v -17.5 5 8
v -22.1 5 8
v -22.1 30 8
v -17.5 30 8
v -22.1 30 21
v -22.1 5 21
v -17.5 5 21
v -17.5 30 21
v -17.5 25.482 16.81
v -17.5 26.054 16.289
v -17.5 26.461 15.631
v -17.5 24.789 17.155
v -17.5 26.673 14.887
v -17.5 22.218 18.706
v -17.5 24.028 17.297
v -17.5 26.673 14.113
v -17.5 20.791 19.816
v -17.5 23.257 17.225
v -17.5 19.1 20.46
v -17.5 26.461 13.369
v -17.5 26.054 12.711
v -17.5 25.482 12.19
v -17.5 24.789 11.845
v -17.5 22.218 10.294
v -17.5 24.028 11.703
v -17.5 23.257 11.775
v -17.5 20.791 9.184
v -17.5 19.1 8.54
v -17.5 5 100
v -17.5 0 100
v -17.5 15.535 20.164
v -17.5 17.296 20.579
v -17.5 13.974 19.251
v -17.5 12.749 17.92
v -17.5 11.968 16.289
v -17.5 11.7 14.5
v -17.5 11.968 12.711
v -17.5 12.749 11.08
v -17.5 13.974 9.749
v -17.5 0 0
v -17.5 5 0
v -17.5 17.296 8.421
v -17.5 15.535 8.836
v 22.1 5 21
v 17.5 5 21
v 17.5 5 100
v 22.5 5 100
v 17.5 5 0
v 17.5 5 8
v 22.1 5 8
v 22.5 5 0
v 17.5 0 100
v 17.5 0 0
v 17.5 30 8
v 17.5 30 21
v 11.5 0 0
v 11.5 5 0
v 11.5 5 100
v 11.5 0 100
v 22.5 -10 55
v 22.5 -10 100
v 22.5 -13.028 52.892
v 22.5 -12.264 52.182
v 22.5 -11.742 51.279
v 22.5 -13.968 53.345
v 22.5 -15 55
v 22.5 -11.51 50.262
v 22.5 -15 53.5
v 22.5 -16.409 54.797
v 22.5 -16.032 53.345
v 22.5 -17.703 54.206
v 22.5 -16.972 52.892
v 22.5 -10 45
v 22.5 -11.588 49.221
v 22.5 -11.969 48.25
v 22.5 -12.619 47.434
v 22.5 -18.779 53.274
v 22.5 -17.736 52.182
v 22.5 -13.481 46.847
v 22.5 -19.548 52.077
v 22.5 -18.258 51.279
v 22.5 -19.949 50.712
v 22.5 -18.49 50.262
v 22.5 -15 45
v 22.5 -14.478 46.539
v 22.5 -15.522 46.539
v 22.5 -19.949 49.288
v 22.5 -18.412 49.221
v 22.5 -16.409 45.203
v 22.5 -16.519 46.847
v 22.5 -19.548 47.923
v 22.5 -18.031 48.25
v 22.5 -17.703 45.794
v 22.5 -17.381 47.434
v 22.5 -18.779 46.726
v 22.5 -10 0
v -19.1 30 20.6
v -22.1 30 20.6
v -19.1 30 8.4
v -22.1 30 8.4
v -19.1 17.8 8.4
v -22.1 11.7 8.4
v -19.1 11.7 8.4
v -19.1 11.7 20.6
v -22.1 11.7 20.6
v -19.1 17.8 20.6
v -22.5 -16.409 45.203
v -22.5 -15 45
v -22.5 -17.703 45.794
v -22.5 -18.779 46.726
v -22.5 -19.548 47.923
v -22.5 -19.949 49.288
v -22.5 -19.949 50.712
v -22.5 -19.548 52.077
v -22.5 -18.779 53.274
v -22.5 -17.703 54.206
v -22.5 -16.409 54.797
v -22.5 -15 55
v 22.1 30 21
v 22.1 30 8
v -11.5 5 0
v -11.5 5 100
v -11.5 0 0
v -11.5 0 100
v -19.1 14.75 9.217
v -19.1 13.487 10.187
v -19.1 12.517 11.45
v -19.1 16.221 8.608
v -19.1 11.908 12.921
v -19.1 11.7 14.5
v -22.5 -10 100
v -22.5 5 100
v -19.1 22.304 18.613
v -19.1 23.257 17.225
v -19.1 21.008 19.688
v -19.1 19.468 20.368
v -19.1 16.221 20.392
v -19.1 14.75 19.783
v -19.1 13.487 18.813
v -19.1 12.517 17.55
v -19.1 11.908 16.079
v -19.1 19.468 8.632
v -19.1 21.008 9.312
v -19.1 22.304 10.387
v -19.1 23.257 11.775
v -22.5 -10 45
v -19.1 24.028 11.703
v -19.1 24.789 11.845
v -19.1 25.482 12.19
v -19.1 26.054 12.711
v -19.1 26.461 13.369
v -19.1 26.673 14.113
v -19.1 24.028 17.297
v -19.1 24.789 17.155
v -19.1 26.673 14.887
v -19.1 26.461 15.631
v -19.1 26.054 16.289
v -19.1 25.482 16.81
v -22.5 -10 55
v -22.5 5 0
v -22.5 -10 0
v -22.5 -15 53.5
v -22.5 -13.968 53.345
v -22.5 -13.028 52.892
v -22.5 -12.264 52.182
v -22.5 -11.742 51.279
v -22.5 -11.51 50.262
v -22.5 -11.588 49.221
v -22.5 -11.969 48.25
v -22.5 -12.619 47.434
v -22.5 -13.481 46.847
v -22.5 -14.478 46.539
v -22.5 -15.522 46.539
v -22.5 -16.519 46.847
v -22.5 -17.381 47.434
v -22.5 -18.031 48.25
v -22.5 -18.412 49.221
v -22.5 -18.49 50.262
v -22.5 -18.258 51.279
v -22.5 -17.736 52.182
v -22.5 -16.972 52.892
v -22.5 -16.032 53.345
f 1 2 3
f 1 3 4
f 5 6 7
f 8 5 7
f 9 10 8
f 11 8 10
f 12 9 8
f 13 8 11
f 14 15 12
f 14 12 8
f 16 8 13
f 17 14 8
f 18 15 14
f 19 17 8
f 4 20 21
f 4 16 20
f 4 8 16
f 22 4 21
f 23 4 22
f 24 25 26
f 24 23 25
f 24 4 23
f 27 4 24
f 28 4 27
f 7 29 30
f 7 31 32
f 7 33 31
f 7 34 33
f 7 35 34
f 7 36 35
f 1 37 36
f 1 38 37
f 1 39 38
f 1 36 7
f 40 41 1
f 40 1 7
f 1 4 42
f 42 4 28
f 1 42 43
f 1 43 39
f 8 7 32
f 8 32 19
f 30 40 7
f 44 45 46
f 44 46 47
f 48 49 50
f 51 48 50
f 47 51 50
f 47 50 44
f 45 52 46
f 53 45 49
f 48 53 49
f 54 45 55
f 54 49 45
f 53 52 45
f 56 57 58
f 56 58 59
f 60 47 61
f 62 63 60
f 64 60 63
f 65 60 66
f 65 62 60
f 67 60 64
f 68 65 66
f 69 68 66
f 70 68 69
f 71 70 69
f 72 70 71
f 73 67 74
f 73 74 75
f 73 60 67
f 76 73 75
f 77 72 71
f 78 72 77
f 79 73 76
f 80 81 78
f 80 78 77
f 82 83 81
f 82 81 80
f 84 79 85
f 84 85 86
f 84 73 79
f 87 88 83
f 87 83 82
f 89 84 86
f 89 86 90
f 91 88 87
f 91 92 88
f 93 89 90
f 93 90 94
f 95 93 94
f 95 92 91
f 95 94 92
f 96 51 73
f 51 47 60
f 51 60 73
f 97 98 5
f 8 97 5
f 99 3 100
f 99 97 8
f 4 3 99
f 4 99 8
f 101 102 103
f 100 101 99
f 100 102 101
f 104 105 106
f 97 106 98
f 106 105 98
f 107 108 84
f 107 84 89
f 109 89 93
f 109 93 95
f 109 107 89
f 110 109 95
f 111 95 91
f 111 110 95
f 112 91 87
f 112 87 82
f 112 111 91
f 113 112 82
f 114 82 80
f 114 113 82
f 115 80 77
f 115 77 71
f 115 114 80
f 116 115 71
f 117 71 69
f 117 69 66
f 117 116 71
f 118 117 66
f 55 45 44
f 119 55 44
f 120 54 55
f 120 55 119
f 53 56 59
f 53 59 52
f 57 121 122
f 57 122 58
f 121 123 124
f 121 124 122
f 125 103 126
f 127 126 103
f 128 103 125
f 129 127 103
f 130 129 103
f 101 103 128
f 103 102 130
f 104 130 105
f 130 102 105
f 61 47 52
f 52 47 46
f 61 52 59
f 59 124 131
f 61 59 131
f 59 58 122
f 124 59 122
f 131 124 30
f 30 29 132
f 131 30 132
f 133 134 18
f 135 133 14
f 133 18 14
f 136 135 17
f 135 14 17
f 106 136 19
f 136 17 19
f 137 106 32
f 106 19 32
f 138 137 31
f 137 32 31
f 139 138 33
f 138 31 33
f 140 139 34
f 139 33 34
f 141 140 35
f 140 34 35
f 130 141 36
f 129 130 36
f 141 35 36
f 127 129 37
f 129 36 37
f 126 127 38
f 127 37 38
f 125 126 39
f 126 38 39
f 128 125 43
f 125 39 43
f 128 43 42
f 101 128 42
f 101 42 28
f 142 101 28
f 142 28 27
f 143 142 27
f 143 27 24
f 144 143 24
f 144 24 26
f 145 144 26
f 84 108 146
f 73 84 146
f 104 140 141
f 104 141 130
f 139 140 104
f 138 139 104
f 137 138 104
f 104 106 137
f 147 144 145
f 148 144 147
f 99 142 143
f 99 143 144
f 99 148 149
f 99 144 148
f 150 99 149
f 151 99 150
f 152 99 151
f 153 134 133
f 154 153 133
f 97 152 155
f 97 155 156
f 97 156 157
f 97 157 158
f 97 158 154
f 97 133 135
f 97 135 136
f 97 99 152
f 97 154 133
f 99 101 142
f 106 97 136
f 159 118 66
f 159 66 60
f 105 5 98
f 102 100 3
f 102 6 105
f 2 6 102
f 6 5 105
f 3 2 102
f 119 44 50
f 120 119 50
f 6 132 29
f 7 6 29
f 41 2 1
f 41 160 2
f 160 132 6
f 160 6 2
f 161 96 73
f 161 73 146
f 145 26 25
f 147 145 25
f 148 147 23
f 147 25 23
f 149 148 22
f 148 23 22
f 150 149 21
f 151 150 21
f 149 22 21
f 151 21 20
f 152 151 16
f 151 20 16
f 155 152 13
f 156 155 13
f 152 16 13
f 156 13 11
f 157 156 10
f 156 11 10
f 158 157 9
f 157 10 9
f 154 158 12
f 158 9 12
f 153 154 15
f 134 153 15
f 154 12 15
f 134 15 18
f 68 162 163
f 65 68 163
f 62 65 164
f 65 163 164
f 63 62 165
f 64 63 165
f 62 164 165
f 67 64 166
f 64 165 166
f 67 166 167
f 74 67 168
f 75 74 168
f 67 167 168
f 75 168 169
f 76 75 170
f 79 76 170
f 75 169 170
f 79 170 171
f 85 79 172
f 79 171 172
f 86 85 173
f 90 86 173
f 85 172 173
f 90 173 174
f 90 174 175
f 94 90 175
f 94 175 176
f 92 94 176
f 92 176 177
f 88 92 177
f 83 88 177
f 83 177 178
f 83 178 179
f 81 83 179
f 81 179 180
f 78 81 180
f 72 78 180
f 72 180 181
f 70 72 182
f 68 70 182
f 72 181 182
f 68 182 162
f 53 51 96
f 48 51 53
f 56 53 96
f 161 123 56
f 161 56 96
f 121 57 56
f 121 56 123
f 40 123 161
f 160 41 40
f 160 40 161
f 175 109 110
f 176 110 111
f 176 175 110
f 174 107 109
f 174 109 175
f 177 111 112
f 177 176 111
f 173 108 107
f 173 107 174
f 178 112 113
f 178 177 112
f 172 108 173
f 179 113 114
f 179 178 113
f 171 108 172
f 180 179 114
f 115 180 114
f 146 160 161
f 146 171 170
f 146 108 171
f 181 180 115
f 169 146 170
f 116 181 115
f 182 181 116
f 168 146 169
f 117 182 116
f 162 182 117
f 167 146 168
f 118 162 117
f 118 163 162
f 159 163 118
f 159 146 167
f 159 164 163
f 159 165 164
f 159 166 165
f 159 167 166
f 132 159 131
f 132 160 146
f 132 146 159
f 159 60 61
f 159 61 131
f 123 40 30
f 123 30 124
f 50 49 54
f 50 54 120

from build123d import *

# Parameters (mm, degrees)
BOSS_EXTRUDE1_DEPTH = 100
SKETCH2_W           = 10
SKETCH2_H           = 5
BOSS_EXTRUDE3_DEPTH = 45
SKETCH3_R           = 5
BOSS_EXTRUDE4_DEPTH = 45
SKETCH4_R           = 3.5
CUT_EXTRUDE1_DEPTH  = 45
SKETCH5_W           = 4.6
SKETCH5_H           = 13
BOSS_EXTRUDE5_DEPTH = 25
SKETCH6_R           = 6.1
SKETCH6_R_2         = 2.8
CUT_EXTRUDE2_DEPTH  = 25
SKETCH7_W           = 12.2
SKETCH7_H           = 22.5
CUT_EXTRUDE3_DEPTH  = 3


with BuildPart() as part:
    # Sketch1 → Boss-Extrude1 (new body)
    with BuildSketch(Plane.XY):
        Polygon((-11.5, 5), (11.5, 5), (11.5, 0), (17.5, 0), (17.5, 5), (22.5, 5), (22.5, -10), (-22.5, -10), (-22.5, 5), (-17.5, 5), (-17.5, 0), (-11.5, 0), align=None)
    extrude(amount=BOSS_EXTRUDE1_DEPTH)

    # Sketch2 → Boss-Extrude3 (add)
    with BuildSketch(Plane.ZY.offset(22.5)):
        with Locations((50, -12.5)):
            Rectangle(SKETCH2_W, SKETCH2_H)
    extrude(amount=-BOSS_EXTRUDE3_DEPTH)

    # Sketch3 → Boss-Extrude4 (add)
    with BuildSketch(Plane.ZY.offset(22.5)):
        with Locations((50, -15)):
            Circle(SKETCH3_R)
    extrude(amount=-BOSS_EXTRUDE4_DEPTH)

    # Sketch4 → Cut-Extrude1 (cut)
    with BuildSketch(Plane.ZY.offset(22.5)):
        with Locations((50, -15)):
            Circle(SKETCH4_R)
    extrude(amount=-CUT_EXTRUDE1_DEPTH, mode=Mode.SUBTRACT)

    # Sketch5 → Boss-Extrude5 (add)
    with BuildSketch(Plane(origin=(0, 5, 0), x_dir=(1, 0, 0), z_dir=(0, 1, 0))):
        with Locations((-19.8, -14.5)):
            Rectangle(SKETCH5_W, SKETCH5_H)
        with Locations((19.8, -14.5)):
            Rectangle(SKETCH5_W, SKETCH5_H)
    extrude(amount=BOSS_EXTRUDE5_DEPTH)

    # Sketch6 → Cut-Extrude2 (cut)
    with BuildSketch(Plane(origin=(-17.5, 0, 0), x_dir=(0, 0, -1), z_dir=(1, 0, 0))):
        with Locations((-14.5, 17.8)):
            Circle(SKETCH6_R)
        with Locations((-14.5, 23.9)):
            Circle(SKETCH6_R_2)
    extrude(amount=-CUT_EXTRUDE2_DEPTH, mode=Mode.SUBTRACT)

    # Sketch7 → Cut-Extrude3 (cut)
    with BuildSketch(Plane.ZY.offset(22.1)):
        with Locations((14.5, 22.95)):
            Rectangle(SKETCH7_W, SKETCH7_H)
    extrude(amount=-CUT_EXTRUDE3_DEPTH, mode=Mode.SUBTRACT)


solid = part.part
